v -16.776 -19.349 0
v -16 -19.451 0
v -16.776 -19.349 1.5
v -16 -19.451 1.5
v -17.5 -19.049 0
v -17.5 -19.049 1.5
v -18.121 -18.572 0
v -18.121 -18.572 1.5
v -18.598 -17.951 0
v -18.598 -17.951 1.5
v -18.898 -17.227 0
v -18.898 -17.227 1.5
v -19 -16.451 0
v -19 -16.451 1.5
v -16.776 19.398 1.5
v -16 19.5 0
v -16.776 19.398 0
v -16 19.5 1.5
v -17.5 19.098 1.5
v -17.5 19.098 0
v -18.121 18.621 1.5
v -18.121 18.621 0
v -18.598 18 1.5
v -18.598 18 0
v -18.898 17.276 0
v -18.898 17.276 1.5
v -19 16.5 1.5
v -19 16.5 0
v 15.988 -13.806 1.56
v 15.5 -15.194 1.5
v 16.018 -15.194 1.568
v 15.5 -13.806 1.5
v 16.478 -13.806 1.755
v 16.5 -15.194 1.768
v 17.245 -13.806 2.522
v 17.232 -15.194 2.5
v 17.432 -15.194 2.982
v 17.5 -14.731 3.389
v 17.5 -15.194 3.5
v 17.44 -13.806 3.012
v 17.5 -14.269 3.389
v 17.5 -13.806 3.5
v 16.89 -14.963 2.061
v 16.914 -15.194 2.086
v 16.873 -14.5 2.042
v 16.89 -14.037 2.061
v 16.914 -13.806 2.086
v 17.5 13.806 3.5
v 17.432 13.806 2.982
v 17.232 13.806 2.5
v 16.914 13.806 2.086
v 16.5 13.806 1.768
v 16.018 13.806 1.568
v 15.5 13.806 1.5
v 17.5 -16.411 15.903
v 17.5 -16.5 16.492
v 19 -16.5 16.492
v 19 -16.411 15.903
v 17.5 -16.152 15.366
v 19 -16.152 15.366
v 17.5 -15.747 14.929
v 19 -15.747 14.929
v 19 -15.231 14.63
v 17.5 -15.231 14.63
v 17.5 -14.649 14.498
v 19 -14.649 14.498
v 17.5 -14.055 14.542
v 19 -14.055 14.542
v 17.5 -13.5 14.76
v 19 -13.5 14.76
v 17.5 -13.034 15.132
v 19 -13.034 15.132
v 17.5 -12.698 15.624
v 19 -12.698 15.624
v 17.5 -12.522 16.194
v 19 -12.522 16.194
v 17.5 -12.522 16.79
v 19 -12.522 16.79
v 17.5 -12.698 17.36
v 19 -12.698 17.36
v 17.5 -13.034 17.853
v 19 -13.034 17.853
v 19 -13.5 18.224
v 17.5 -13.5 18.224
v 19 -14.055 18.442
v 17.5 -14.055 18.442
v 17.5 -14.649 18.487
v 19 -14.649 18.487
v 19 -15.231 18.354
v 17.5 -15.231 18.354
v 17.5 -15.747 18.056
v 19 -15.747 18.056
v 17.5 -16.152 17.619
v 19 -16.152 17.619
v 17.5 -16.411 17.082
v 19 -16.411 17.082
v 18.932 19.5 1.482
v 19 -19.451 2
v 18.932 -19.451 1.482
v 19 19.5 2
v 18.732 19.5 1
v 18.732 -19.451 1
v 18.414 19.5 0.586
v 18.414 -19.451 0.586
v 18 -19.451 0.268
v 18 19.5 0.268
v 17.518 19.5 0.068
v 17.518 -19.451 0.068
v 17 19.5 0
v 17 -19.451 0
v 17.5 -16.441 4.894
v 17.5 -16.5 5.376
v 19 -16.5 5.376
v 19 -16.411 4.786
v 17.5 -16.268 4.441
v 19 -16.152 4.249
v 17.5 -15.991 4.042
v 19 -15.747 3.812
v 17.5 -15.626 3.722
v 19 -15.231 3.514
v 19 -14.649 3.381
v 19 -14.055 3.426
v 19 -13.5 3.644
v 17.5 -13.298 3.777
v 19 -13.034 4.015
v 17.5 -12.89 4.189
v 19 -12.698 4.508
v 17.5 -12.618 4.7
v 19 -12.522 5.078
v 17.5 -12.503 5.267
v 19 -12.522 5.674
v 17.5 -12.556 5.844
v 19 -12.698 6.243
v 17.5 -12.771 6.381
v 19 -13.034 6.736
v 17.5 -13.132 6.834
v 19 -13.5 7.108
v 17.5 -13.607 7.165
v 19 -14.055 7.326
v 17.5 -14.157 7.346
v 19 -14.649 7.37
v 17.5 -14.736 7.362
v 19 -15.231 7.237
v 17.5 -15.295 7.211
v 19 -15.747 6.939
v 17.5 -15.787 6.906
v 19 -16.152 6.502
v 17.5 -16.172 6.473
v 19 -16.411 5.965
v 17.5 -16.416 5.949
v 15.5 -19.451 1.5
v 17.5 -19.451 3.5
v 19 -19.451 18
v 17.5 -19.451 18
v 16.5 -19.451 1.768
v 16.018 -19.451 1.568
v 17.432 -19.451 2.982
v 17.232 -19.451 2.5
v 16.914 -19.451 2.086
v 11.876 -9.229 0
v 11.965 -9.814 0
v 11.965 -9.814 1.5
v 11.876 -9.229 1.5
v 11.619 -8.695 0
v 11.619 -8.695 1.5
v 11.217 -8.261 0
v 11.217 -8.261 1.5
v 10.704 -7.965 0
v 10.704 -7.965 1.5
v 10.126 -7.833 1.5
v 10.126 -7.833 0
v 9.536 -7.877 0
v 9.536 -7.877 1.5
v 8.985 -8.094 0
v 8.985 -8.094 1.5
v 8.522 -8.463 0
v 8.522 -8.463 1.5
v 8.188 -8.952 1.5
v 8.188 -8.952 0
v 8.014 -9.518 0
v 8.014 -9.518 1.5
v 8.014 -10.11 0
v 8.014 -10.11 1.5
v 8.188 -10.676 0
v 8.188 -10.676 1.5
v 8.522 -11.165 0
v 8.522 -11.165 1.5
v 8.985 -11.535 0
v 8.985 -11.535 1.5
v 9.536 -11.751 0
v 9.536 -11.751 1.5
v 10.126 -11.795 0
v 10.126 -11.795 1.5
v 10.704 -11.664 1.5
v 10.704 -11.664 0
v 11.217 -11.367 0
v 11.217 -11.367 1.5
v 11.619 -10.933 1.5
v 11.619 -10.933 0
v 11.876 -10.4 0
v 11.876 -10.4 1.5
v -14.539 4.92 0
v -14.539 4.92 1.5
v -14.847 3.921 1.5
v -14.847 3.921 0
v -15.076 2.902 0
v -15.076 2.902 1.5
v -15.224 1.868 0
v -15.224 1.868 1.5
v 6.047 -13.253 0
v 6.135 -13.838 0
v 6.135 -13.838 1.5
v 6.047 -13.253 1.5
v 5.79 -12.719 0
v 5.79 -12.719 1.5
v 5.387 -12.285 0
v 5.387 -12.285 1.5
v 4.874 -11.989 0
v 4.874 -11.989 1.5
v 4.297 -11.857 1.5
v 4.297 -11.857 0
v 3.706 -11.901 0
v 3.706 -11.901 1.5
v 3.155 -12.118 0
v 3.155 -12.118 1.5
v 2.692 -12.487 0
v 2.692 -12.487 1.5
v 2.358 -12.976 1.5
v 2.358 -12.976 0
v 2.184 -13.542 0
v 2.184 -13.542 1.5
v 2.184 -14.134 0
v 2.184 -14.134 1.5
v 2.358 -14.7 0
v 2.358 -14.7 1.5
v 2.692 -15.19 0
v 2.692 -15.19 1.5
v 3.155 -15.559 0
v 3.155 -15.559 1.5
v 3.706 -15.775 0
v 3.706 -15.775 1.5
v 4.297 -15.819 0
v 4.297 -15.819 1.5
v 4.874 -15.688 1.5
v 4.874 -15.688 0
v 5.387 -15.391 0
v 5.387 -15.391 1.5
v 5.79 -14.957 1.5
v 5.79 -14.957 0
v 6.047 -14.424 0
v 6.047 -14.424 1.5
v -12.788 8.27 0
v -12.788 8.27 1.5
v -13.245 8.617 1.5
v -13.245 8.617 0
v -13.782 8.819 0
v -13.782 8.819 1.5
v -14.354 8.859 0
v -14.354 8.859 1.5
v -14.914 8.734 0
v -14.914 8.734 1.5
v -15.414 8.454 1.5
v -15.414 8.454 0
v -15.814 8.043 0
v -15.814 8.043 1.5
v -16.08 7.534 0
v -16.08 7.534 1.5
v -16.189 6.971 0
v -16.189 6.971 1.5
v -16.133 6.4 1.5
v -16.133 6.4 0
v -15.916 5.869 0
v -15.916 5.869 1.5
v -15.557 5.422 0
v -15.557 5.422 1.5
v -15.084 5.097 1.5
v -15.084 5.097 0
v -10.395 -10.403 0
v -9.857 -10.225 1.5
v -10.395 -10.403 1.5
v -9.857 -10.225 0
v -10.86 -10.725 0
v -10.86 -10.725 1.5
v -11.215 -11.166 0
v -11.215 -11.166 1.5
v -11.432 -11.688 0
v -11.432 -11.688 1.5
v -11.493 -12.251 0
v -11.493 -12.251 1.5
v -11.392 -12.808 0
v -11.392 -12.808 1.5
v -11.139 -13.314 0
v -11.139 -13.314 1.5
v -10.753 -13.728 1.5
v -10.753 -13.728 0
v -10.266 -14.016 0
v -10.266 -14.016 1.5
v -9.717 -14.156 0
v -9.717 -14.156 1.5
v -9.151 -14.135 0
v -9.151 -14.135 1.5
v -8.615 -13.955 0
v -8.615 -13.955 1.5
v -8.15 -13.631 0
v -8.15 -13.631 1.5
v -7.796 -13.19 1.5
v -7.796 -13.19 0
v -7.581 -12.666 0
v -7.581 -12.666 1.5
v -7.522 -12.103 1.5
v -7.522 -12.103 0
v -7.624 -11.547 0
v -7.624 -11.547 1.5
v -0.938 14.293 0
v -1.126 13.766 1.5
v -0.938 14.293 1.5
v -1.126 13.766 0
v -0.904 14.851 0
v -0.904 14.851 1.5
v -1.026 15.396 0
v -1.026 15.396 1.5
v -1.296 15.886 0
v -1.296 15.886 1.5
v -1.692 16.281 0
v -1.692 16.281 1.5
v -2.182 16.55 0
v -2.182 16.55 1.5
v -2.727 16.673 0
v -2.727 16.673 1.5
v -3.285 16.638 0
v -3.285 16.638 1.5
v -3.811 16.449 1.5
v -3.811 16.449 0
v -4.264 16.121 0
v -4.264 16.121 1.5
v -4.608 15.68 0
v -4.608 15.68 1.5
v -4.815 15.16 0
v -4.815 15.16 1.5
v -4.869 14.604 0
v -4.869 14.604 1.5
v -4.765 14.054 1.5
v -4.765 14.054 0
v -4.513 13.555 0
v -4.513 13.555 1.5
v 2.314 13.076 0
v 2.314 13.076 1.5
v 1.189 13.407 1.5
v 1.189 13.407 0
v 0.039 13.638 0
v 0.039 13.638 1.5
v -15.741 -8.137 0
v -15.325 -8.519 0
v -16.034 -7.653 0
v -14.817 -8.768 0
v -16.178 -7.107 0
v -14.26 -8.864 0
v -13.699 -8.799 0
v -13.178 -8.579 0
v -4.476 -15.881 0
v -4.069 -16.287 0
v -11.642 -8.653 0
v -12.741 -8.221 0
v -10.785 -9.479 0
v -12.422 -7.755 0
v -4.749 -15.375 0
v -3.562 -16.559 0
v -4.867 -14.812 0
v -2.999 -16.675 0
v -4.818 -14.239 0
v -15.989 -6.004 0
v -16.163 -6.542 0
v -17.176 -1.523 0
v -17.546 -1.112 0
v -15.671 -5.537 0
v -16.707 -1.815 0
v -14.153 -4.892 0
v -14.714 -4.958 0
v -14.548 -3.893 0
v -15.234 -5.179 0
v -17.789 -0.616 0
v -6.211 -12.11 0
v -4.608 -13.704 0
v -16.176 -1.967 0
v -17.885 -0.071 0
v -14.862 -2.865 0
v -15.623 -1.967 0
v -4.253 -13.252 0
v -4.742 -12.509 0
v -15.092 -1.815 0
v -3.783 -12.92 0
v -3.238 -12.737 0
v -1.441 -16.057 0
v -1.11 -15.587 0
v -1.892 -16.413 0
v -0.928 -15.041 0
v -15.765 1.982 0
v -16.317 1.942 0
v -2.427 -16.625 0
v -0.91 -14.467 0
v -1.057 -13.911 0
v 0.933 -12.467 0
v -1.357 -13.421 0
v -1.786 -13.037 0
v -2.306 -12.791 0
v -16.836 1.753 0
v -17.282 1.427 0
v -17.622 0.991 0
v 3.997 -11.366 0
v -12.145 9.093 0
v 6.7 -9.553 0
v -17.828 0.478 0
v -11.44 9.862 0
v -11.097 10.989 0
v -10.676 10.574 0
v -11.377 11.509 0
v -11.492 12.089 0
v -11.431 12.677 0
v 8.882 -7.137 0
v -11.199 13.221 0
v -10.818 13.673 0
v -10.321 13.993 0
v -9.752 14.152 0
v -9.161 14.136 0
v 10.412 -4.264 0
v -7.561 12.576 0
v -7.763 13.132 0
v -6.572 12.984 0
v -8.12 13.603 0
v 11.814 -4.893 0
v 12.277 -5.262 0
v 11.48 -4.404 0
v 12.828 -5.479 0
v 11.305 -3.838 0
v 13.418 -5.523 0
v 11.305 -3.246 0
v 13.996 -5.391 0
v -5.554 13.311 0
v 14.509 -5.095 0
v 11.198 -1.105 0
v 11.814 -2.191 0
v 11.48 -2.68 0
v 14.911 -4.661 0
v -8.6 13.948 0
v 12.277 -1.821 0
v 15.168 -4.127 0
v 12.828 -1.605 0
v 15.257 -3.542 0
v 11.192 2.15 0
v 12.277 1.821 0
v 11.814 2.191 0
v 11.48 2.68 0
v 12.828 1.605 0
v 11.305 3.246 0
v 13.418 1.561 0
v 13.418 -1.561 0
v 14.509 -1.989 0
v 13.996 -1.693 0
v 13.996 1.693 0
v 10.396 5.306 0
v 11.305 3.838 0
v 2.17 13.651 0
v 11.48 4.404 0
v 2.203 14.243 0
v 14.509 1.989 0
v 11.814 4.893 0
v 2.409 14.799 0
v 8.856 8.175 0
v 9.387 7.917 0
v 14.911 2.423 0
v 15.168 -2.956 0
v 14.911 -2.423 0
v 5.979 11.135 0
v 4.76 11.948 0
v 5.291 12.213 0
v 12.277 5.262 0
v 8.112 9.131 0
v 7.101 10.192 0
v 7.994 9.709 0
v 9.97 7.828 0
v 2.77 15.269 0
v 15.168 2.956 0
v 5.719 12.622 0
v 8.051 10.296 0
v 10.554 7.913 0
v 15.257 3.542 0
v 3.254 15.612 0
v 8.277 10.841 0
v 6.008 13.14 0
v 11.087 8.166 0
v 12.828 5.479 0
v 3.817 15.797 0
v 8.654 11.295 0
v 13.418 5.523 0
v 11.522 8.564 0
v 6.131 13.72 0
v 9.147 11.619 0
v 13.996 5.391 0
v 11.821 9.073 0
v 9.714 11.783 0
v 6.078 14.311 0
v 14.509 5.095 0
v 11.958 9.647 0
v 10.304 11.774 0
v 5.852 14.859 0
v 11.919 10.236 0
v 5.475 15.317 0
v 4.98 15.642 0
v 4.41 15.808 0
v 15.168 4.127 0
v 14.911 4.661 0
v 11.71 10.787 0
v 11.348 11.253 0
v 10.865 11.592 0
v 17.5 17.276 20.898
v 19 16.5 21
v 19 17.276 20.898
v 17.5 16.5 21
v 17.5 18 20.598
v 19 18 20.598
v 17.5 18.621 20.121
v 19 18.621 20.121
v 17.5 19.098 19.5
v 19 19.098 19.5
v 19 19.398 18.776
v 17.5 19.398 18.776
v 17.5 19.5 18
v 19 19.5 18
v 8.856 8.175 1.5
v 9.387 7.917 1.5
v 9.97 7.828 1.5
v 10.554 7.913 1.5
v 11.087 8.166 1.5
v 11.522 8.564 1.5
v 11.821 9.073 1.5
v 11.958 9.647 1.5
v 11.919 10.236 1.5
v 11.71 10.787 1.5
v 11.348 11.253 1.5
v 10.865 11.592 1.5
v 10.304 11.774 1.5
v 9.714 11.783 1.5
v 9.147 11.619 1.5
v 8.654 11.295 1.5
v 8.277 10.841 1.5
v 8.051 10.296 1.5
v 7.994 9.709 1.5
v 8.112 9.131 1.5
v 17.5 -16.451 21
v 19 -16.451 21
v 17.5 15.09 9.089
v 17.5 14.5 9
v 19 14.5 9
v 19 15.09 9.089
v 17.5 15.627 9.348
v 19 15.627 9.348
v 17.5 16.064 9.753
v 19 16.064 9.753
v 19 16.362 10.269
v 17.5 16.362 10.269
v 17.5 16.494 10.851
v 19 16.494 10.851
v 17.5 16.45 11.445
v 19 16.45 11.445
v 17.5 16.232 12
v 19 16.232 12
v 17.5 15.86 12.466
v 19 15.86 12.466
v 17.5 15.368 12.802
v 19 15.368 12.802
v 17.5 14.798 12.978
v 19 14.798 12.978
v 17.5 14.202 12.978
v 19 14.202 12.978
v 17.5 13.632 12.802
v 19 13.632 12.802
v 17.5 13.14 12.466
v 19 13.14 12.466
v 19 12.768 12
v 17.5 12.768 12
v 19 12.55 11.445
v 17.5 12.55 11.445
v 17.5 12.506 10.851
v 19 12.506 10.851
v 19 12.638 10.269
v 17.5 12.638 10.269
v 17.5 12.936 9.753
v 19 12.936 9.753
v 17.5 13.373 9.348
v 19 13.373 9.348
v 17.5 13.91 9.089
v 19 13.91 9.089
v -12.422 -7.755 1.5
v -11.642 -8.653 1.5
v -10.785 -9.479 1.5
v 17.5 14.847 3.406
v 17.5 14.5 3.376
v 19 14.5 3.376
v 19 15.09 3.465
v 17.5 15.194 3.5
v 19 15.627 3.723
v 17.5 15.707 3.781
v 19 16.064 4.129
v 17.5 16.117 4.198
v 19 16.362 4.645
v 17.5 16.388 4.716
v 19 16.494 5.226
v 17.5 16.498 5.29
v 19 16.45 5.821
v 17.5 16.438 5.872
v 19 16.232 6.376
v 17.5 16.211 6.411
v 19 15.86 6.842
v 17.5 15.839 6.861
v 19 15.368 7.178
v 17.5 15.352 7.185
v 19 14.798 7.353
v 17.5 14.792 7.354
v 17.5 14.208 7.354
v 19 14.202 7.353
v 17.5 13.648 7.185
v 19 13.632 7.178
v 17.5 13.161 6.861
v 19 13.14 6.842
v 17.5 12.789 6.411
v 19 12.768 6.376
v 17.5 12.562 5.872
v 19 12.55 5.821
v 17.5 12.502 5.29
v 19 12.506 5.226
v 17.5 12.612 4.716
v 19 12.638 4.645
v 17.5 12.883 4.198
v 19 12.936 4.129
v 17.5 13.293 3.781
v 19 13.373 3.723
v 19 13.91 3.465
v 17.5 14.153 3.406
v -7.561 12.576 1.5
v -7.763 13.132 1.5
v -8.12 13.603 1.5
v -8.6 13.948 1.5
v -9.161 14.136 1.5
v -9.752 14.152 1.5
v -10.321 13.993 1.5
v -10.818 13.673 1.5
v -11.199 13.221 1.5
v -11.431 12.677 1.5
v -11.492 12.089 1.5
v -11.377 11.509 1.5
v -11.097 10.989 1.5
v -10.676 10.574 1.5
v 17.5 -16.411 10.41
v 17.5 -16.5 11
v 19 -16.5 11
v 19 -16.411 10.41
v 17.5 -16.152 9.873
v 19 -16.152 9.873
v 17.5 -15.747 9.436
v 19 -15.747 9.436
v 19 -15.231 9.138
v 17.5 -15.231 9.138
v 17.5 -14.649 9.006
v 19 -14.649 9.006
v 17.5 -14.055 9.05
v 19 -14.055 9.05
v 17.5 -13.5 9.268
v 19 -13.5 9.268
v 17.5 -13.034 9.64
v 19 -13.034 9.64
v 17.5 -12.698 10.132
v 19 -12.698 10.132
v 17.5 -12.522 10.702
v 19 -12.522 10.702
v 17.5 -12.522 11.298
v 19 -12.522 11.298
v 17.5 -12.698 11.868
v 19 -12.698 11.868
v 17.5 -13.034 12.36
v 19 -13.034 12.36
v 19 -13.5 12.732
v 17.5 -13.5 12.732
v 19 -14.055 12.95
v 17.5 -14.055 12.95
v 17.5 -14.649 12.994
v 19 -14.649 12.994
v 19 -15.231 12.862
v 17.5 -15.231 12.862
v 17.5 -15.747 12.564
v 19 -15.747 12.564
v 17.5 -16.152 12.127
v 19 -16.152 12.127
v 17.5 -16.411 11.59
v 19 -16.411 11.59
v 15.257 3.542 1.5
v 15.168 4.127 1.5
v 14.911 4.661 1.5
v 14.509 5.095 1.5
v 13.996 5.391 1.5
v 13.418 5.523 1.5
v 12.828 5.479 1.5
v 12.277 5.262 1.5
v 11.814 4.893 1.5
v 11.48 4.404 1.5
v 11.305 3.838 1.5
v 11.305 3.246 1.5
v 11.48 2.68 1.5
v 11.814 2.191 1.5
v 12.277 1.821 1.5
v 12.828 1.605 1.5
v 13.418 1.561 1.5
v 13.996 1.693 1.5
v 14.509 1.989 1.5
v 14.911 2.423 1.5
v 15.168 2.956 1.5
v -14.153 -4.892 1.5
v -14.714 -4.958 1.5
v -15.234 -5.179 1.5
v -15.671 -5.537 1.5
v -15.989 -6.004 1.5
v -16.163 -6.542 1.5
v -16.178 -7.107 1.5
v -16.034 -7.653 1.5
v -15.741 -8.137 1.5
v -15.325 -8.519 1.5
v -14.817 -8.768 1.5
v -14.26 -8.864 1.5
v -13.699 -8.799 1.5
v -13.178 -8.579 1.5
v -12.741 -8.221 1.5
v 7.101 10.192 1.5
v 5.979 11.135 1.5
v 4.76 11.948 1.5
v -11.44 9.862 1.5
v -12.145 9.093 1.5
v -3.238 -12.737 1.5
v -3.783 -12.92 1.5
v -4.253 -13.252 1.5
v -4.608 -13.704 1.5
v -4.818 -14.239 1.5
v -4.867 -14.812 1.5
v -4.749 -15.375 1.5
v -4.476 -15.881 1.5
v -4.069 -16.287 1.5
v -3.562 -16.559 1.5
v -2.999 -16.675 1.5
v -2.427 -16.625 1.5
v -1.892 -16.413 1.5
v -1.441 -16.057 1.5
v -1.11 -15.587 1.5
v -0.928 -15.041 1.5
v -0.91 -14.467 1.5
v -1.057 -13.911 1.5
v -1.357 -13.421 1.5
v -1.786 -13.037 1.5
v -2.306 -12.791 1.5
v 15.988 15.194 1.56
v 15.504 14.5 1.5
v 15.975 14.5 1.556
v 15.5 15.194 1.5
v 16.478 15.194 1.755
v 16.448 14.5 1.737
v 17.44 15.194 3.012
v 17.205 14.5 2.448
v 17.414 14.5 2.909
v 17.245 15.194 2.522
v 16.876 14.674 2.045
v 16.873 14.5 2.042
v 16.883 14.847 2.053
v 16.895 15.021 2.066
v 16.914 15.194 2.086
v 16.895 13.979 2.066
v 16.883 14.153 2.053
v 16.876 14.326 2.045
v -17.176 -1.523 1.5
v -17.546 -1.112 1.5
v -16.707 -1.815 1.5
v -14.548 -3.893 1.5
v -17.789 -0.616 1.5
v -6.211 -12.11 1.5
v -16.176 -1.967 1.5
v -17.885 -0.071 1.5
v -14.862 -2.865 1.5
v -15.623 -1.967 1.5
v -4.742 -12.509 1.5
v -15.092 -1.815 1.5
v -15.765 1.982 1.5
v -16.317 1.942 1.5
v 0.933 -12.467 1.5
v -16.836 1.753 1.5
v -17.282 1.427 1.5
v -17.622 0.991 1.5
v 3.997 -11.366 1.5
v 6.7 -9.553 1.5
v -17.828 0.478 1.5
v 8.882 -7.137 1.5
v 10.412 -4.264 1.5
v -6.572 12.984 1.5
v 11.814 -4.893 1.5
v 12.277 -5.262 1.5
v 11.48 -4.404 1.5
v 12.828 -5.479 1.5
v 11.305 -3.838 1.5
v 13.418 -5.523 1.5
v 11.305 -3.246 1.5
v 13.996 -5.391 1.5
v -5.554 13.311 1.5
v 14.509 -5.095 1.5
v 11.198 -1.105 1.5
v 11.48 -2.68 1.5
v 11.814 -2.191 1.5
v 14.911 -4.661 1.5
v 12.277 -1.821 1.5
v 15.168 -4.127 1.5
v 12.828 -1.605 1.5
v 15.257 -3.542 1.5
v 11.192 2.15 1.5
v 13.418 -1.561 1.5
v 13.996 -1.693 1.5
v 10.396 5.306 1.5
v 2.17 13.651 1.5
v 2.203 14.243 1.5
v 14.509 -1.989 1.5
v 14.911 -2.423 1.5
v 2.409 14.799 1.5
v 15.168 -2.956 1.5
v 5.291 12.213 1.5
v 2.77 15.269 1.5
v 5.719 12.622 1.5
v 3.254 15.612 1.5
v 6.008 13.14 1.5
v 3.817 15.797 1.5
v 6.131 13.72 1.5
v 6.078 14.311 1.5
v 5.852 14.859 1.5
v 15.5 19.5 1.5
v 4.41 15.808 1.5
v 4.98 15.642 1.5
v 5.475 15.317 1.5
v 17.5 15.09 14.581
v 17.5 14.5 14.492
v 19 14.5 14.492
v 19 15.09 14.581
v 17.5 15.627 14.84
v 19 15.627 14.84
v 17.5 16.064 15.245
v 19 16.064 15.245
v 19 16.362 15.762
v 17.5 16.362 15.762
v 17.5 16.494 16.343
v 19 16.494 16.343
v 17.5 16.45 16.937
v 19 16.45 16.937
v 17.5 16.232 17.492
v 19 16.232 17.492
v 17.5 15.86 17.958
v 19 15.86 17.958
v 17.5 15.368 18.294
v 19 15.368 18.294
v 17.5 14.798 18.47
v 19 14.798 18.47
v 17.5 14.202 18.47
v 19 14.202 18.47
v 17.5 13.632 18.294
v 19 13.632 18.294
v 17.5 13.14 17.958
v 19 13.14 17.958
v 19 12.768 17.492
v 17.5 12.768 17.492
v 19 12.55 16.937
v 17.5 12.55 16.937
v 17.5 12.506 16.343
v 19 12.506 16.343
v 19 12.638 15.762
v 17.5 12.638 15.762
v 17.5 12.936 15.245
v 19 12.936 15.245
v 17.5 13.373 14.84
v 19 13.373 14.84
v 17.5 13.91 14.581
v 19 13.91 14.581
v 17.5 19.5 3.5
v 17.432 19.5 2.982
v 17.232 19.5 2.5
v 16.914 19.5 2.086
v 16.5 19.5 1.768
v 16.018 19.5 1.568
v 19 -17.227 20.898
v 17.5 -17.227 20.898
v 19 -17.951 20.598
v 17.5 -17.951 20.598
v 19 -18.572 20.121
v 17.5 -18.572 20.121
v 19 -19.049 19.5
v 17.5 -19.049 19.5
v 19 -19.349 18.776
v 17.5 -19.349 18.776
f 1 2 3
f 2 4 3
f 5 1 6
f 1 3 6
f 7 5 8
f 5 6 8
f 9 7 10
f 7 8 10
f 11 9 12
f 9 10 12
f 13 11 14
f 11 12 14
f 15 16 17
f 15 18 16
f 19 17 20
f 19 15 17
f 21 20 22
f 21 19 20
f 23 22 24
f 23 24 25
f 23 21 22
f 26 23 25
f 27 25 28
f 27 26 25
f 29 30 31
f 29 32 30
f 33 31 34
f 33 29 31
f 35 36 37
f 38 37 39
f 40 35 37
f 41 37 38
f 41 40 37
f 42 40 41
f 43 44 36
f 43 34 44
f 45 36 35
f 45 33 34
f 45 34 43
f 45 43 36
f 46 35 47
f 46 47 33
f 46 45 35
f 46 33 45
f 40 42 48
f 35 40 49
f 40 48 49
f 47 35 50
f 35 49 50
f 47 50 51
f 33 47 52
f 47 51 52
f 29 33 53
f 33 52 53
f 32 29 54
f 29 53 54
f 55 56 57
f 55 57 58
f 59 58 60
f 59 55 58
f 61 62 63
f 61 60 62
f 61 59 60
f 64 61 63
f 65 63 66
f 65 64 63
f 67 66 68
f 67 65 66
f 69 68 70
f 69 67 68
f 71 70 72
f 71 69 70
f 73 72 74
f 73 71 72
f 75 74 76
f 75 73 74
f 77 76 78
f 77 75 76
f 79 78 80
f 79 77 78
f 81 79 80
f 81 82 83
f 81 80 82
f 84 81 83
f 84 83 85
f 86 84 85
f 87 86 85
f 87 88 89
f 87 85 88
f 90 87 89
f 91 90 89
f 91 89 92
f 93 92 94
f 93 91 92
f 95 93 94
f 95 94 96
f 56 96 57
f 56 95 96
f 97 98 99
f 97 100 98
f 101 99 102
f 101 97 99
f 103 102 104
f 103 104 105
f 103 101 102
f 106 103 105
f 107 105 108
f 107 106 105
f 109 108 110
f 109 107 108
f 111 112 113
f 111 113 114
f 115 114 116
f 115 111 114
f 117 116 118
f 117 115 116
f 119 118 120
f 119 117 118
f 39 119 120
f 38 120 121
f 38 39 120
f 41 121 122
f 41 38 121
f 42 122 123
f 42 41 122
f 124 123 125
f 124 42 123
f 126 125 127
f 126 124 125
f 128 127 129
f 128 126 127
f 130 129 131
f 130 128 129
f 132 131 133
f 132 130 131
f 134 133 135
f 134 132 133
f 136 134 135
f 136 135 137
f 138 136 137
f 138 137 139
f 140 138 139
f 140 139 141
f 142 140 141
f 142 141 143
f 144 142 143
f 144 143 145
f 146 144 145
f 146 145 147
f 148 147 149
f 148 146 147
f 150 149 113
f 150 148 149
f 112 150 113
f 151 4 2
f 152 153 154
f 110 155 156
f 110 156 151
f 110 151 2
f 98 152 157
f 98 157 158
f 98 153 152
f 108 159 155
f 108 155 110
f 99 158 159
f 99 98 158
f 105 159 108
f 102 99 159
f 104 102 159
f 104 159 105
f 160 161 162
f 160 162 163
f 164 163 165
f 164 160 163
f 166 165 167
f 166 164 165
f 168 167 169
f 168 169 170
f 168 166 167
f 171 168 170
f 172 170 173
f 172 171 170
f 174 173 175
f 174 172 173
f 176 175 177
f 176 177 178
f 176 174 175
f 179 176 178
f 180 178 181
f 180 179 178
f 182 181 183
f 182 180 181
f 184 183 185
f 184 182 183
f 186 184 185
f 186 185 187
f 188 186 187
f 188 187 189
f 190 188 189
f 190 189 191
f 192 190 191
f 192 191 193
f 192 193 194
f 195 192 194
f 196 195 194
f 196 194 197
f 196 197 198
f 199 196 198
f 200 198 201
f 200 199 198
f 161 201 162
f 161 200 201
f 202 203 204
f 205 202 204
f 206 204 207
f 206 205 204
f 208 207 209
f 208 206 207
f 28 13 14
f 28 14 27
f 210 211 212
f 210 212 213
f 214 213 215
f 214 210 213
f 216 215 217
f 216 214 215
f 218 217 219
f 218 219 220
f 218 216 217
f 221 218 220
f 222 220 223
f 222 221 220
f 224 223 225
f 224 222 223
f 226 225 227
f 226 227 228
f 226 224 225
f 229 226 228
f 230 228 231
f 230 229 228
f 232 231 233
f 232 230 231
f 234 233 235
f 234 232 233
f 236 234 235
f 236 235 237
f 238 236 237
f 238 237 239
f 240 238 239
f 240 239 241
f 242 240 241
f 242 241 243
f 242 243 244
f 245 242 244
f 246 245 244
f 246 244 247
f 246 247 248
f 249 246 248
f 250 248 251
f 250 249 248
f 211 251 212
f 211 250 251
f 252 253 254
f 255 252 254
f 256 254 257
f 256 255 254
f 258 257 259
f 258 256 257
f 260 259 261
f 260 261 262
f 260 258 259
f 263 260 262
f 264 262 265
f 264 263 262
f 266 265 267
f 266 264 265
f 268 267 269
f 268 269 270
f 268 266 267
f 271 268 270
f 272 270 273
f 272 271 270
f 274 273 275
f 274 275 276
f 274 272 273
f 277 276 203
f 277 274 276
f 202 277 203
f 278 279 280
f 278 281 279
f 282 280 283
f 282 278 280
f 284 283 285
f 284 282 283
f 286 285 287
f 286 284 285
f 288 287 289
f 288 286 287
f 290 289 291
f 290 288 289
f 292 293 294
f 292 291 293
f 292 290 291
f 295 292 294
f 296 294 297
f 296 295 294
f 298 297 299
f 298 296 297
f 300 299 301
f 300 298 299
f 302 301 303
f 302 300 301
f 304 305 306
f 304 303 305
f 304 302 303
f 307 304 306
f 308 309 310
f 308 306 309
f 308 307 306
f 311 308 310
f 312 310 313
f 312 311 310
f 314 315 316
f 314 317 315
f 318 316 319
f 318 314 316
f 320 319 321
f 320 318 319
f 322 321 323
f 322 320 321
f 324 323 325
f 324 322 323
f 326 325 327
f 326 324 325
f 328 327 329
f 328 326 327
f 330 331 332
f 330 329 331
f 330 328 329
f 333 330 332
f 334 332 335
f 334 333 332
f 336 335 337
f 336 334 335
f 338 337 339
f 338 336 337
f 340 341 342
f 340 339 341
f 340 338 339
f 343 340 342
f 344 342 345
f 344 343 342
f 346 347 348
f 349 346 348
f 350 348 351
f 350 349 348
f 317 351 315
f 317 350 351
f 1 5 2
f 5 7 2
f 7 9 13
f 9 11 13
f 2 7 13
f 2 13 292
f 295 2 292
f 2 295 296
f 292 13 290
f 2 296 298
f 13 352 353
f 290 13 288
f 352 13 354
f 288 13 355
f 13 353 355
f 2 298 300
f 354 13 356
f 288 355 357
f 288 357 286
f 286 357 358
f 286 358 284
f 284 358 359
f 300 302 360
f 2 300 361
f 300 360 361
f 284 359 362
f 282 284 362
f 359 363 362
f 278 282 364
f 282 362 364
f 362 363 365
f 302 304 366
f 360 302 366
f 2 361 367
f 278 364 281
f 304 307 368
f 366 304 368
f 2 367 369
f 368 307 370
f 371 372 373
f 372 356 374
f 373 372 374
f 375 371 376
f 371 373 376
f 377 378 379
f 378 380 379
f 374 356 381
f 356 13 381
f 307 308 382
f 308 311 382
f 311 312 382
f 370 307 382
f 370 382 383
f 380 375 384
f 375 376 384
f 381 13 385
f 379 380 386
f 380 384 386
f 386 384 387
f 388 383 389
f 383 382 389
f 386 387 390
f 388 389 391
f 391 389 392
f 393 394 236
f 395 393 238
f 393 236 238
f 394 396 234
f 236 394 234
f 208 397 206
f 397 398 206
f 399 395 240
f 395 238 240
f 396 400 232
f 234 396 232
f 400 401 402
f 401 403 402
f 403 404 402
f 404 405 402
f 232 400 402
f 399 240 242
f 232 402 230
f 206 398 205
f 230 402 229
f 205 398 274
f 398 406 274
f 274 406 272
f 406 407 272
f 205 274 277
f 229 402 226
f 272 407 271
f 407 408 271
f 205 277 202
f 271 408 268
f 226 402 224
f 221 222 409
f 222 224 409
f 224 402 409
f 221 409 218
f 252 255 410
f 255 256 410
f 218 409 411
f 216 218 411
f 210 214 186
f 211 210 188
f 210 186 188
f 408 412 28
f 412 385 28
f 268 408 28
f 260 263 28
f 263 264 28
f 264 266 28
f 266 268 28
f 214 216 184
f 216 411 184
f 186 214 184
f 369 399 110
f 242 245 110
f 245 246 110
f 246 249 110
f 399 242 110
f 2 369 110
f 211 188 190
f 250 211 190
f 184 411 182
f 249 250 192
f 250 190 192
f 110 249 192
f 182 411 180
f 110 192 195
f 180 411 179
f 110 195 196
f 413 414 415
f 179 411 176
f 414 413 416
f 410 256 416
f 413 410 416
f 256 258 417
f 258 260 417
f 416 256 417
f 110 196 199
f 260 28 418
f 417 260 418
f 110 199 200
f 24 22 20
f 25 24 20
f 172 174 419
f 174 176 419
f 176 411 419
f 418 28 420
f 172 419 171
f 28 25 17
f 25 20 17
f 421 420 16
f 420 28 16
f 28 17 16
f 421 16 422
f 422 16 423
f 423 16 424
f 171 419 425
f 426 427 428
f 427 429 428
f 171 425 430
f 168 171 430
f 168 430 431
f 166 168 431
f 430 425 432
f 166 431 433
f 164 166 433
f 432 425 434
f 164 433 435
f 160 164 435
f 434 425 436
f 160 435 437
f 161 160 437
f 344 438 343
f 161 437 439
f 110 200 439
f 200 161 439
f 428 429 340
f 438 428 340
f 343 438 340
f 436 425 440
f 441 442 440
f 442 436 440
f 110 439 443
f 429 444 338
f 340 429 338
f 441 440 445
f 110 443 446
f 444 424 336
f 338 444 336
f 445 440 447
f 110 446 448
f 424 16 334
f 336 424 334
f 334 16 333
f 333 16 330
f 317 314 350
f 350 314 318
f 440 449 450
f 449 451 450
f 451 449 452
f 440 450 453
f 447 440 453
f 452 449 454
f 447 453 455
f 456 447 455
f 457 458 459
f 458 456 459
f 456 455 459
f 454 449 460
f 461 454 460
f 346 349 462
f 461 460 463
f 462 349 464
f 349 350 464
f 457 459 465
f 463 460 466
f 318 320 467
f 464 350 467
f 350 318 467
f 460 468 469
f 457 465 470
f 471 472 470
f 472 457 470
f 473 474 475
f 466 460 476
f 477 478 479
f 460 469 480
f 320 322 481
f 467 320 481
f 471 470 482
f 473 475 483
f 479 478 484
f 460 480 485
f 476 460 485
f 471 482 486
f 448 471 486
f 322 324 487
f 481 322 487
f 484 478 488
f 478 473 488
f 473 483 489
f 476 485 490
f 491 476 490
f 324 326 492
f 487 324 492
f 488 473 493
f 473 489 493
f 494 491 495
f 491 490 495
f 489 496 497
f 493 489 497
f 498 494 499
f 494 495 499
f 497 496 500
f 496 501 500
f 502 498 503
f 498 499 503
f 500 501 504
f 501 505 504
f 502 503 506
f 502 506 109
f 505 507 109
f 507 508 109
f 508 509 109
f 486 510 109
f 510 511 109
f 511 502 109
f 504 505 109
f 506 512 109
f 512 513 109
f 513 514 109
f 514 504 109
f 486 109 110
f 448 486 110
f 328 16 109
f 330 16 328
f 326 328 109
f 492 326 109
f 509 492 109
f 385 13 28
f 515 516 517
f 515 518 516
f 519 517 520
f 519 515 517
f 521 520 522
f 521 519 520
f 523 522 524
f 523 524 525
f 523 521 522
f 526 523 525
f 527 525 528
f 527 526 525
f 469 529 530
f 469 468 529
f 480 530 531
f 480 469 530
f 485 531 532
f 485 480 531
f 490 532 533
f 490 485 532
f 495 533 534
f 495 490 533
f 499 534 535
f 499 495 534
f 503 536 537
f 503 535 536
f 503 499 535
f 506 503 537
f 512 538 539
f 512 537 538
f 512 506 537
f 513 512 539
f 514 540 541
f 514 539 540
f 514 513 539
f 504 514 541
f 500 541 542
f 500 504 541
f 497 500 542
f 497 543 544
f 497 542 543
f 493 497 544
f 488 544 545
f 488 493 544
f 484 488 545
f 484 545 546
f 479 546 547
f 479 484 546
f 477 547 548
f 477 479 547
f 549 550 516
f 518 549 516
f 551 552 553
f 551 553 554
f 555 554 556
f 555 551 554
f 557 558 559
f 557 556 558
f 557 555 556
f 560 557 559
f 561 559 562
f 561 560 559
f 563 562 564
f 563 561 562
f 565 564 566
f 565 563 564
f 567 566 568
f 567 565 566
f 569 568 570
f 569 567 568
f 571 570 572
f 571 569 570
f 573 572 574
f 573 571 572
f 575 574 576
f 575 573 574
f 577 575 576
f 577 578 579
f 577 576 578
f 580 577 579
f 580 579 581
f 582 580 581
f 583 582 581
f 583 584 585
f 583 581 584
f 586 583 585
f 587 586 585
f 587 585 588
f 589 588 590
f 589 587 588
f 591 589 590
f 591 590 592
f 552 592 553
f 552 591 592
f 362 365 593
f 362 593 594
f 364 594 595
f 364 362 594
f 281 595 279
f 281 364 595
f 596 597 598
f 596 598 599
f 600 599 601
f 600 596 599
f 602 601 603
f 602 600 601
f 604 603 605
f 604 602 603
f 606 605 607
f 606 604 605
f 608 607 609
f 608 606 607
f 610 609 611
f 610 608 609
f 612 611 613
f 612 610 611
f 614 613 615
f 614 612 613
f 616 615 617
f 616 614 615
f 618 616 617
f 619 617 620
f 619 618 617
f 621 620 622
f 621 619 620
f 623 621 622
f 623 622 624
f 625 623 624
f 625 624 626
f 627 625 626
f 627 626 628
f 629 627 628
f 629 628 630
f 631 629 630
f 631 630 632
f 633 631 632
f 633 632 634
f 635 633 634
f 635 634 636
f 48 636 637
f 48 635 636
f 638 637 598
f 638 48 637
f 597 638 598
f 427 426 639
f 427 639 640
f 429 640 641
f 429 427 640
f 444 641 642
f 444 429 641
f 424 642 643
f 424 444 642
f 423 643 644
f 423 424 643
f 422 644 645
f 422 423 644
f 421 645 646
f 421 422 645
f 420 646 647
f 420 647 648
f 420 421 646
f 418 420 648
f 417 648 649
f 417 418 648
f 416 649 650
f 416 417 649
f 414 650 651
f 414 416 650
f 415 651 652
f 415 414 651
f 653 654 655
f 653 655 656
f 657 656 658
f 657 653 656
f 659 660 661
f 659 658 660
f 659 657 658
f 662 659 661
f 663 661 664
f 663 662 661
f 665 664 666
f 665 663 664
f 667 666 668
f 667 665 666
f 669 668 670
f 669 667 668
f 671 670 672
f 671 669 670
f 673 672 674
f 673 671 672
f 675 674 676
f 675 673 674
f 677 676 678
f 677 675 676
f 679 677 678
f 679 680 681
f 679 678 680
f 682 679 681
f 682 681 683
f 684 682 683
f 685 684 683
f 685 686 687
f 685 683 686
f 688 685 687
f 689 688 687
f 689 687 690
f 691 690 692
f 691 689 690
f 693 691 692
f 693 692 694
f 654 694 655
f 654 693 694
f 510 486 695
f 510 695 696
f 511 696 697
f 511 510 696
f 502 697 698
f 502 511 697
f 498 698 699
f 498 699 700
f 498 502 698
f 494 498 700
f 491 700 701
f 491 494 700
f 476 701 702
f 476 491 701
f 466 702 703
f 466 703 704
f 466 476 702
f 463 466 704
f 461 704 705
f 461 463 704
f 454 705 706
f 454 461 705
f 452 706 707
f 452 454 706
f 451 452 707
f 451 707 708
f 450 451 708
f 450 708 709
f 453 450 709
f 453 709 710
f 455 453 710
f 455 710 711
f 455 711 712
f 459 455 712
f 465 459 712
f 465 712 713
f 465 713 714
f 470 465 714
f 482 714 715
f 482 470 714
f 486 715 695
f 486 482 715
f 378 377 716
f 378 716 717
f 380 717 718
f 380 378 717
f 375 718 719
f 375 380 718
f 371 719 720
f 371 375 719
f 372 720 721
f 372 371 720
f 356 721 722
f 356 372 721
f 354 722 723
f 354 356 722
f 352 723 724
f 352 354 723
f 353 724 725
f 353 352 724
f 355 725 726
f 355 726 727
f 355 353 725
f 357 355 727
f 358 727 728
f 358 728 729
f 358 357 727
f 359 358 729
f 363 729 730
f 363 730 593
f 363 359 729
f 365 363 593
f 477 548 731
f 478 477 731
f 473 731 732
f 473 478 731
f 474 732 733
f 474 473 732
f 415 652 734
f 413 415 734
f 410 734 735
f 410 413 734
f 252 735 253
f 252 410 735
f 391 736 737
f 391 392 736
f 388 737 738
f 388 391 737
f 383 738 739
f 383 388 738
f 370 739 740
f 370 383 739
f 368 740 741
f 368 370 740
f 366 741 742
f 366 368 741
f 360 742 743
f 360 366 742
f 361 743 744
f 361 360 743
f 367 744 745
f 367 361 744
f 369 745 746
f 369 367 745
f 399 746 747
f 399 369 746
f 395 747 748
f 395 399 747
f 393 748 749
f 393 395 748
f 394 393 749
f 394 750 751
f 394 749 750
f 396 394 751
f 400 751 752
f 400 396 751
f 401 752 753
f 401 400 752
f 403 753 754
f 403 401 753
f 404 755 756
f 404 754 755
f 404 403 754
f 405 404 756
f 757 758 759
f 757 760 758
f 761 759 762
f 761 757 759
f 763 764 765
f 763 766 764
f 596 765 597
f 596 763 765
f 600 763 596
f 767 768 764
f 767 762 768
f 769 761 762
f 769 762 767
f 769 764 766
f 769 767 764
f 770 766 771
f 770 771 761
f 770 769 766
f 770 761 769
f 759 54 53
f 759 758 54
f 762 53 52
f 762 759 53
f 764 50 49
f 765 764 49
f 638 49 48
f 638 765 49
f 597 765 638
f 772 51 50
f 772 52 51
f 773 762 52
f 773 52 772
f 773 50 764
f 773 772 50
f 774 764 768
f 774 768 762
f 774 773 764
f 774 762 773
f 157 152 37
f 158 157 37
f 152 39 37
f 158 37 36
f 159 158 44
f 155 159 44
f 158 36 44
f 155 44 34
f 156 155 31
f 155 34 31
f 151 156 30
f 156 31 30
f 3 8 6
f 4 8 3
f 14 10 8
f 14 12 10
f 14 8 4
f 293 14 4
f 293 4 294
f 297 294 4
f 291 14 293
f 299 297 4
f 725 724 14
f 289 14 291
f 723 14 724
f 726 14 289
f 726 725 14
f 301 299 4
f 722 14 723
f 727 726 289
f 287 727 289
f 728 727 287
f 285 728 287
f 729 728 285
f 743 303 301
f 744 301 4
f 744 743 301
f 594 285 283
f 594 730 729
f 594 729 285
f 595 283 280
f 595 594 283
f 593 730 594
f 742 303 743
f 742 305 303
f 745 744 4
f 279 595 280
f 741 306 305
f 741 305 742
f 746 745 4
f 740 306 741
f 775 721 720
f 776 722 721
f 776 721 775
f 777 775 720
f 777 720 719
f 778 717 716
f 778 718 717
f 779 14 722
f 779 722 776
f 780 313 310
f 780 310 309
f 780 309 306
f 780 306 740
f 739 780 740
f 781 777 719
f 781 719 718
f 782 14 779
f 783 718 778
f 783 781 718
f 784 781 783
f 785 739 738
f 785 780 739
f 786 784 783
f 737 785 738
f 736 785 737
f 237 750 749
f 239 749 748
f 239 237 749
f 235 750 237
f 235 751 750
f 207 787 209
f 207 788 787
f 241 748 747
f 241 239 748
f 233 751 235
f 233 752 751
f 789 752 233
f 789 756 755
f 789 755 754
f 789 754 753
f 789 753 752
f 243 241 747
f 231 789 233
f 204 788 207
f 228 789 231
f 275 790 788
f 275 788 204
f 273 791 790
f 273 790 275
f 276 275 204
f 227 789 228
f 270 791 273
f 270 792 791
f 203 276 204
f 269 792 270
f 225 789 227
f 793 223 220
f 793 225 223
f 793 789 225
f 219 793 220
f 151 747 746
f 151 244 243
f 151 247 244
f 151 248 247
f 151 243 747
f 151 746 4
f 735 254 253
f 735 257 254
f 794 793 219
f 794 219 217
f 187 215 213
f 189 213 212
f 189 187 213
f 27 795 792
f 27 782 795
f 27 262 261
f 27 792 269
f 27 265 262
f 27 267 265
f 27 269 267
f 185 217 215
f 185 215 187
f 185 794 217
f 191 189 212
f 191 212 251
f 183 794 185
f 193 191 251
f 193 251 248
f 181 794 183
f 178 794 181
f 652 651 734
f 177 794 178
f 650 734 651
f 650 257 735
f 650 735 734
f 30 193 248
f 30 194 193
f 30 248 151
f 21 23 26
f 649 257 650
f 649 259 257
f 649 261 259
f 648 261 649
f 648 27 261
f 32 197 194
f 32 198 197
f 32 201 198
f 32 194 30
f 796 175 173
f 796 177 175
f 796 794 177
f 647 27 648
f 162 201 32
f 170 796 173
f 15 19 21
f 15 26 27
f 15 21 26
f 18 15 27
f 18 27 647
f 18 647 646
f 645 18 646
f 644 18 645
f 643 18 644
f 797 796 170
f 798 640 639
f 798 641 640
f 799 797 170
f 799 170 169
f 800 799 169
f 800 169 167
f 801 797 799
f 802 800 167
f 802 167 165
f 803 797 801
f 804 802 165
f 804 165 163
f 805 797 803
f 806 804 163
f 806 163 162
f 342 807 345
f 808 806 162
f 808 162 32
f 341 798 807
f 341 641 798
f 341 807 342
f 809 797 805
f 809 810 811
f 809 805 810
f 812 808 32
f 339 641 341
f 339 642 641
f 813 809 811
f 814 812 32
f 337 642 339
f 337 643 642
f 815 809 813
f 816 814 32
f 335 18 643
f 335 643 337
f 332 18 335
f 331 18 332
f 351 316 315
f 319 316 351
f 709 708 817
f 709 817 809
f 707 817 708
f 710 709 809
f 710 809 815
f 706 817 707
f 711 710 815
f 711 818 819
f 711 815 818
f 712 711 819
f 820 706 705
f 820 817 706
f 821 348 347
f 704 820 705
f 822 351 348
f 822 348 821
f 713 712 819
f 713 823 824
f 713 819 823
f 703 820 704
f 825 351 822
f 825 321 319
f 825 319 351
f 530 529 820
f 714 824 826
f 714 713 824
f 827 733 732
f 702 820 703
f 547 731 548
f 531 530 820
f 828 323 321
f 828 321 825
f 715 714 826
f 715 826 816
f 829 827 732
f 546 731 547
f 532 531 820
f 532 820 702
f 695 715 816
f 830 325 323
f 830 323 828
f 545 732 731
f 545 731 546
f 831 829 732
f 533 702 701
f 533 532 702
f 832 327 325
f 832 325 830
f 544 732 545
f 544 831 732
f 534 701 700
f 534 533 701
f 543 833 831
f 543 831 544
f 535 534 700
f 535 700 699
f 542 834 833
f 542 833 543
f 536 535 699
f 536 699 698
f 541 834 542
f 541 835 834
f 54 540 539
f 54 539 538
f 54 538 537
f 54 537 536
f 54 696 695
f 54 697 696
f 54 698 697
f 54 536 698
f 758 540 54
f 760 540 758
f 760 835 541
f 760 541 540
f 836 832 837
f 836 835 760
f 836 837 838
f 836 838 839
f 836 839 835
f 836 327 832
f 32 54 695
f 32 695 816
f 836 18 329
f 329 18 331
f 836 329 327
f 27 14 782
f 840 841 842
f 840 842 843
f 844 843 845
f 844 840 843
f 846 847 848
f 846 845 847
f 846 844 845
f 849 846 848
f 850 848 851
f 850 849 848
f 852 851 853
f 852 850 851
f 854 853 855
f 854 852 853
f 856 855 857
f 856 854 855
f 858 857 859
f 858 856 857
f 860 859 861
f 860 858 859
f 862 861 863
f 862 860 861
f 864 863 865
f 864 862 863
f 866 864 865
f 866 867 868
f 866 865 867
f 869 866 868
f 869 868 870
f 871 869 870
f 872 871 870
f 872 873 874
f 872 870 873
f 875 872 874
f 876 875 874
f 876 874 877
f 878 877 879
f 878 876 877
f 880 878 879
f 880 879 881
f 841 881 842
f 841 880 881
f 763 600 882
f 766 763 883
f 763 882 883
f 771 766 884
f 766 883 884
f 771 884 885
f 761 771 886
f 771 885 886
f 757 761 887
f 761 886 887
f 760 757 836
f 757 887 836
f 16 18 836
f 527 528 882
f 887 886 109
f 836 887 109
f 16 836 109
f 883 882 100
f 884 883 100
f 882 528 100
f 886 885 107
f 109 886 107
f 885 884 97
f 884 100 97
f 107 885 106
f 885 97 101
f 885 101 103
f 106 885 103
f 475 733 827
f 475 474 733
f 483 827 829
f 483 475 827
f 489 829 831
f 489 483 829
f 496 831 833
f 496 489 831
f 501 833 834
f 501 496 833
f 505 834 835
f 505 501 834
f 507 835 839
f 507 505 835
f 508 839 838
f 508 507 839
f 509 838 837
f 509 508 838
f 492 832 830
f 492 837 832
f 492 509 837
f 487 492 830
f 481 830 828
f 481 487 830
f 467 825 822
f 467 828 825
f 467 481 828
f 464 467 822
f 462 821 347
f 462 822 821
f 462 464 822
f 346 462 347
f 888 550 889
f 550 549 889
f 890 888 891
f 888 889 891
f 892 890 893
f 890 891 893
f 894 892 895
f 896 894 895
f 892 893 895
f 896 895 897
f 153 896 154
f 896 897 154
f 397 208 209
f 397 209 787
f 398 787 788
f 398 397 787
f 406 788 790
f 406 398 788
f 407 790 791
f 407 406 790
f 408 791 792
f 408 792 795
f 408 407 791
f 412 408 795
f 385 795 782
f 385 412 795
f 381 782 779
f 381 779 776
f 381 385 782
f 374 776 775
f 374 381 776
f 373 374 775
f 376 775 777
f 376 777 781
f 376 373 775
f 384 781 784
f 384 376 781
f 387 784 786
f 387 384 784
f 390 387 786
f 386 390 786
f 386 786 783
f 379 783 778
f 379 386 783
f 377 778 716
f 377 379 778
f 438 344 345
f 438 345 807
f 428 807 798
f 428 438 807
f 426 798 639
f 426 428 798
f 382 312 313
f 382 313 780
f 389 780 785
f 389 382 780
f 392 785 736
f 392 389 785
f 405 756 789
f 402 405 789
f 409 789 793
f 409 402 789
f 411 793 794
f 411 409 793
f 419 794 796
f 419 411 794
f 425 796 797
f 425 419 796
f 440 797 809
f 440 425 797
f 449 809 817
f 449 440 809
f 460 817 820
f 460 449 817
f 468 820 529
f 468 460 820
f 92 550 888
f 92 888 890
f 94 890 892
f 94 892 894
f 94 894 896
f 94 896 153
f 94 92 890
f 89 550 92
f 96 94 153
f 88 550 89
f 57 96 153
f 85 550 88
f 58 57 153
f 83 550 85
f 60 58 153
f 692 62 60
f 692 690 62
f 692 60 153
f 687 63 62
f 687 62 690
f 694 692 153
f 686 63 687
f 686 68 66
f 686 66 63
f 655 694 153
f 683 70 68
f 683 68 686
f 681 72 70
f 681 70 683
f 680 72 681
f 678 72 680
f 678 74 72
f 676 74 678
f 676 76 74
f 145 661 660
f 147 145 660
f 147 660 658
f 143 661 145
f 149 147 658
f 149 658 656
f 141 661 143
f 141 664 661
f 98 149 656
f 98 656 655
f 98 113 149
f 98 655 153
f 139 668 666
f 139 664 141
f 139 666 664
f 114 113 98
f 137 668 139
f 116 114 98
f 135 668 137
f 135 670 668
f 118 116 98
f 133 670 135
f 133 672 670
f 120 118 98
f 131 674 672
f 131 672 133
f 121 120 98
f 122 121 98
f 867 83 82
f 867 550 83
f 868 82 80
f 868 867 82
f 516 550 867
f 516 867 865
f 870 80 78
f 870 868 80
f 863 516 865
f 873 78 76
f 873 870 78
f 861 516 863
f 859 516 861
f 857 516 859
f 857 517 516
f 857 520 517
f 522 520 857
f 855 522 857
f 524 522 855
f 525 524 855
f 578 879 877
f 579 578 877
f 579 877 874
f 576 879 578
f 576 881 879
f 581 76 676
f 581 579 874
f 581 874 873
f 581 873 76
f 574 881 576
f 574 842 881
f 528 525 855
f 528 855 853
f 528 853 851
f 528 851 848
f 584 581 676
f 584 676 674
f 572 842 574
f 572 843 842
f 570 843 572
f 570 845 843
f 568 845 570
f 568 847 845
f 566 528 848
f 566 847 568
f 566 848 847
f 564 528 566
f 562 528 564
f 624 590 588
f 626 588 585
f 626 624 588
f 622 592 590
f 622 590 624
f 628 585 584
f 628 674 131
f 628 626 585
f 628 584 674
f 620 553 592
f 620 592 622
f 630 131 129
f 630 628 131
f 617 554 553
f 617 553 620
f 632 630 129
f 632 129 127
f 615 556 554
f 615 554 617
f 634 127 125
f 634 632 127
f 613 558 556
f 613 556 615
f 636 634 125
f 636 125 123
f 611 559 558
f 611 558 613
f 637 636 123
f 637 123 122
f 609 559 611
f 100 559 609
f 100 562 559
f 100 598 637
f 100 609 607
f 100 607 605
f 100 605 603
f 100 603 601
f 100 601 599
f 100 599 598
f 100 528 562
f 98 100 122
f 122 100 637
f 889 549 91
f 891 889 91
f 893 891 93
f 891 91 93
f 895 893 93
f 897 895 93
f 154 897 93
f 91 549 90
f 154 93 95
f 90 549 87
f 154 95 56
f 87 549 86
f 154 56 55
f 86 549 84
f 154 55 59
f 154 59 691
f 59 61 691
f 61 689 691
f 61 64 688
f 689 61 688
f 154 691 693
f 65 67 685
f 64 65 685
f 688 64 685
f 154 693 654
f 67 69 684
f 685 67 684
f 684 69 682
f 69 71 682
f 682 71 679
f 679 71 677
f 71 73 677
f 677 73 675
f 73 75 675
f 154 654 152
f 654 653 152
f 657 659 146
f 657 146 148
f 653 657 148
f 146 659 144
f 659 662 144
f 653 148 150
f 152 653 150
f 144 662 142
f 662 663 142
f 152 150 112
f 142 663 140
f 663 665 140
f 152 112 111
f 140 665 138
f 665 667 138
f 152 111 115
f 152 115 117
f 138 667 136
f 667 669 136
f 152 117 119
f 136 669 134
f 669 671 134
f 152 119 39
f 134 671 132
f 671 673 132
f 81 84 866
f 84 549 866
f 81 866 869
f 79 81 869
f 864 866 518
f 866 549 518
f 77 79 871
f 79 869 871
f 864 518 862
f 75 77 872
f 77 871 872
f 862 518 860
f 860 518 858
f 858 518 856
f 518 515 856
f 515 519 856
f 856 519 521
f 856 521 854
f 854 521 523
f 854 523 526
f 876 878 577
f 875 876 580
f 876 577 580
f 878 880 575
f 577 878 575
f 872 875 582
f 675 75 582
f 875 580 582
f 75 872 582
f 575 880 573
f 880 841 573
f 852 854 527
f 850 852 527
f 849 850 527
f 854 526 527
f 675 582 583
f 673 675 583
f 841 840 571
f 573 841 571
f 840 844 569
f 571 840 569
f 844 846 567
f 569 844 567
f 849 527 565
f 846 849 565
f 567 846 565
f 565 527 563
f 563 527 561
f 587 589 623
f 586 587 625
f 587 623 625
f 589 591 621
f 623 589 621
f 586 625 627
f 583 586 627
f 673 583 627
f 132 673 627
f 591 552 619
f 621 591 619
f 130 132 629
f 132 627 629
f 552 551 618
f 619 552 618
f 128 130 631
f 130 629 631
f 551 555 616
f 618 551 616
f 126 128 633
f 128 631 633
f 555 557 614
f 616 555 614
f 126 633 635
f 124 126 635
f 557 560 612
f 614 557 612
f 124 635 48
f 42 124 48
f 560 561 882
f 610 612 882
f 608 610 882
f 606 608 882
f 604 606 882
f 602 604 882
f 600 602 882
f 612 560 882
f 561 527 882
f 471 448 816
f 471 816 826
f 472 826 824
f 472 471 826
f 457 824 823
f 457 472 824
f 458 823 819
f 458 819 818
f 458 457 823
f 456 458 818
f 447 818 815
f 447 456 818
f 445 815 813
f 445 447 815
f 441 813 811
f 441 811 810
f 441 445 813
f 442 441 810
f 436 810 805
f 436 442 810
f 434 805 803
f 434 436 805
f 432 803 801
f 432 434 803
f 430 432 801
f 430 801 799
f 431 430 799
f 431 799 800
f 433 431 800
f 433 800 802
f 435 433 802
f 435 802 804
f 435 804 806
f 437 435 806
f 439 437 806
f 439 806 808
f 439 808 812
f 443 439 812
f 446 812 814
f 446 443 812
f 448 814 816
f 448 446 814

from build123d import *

# Parameters (mm, degrees)
SKETCH1_W               = 38
SKETCH1_H               = 38.950729927
SKETCH1_R               = 13.294995111
BOSS_EXTRUDE1_DEPTH     = 1.5
SKETCH4_W               = 19.5
SKETCH4_H               = 38.950729927
BOSS_EXTRUDE2_DEPTH     = 1.5
CUT_EXTRUDE2_DEPTH      = 35.383862494
CUT_EXTRUDE2_DEPTH_BACK = 35.383862494
SKETCH5_R               = 2
FILLET2_R               = 3
FILLET6_R               = 2
SKETCH6_R               = 1.98665291
CUT_EXTRUDE5_DEPTH      = 1.5


with BuildPart() as part:
    # Sketch1 → Boss-Extrude1 (new body)
    with BuildSketch(Plane.XY):
        with Locations((0, 0.024635036)):
            Rectangle(SKETCH1_W, SKETCH1_H)
        with Locations((-2, 0.5)):
            Circle(SKETCH1_R, mode=Mode.SUBTRACT)
    extrude(amount=BOSS_EXTRUDE1_DEPTH)

    # Sketch4 → Boss-Extrude2 (add)
    with BuildSketch(Plane(origin=(19, 0, 0), x_dir=(0, 0, -1), z_dir=(1, 0, 0))):
        with Locations((-11.25, 0.024635036)):
            Rectangle(SKETCH4_W, SKETCH4_H)
    extrude(amount=-BOSS_EXTRUDE2_DEPTH)

    # Sketch5 → Cut-Extrude2 (cut, two sides: drawn at the far end of the back side and taken through both)
    with BuildSketch(Plane(origin=(0, 0, 0), x_dir=(0, 0, -1), z_dir=(1, 0, 0)).offset(-CUT_EXTRUDE2_DEPTH_BACK)):
        with Locations((-5.375668666, 14.5)):
            Circle(SKETCH5_R)
        with Locations((-11, 14.5)):
            Circle(SKETCH5_R)
        with Locations((-16.492234483, 14.5)):
            Circle(SKETCH5_R)
        with Locations(Location((-16.492234483, -14.5, 0), (0, 0, 270))):
            Circle(SKETCH5_R)
        with Locations(Location((-11, -14.5, 0), (0, 0, 270))):
            Circle(SKETCH5_R)
        with Locations(Location((-5.375668666, -14.5, 0), (0, 0, 270))):
            Circle(SKETCH5_R)
    extrude(amount=CUT_EXTRUDE2_DEPTH + CUT_EXTRUDE2_DEPTH_BACK, mode=Mode.SUBTRACT)

    # Fillet2
    fillet2_edges = [part.edges().sort_by_distance(p)[0] for p in [
        (18.25, -19.450729927, 21),
        (18.25, 19.5, 21),
        (-19, -19.450729927, 0.75),
        (-19, 19.5, 0.75),
    ]]
    fillet(fillet2_edges, radius=FILLET2_R)

    # Fillet6
    fillet6_edges = [part.edges().sort_by_distance(p)[0] for p in [
        (19, 0.024635036, 0),
        (17.5, 0.024635036, 1.5),
    ]]
    fillet(fillet6_edges, radius=FILLET6_R)

    # Sketch6 → Cut-Extrude5 (cut)
    with BuildSketch(Plane.XY):
        with Locations((-15.899992969, 0)):
            Circle(SKETCH6_R)
        with Locations((-14.204742149, 6.877902946)):
            Circle(SKETCH6_R)
        with Locations((-9.507351221, 12.180161215)):
            Circle(SKETCH6_R)
        with Locations((-2.883935837, 14.692091337)):
            Circle(SKETCH6_R)
        with Locations((4.148159359, 13.838240392)):
            Circle(SKETCH6_R)
        with Locations((9.977966104, 9.814215342)):
            Circle(SKETCH6_R)
        with Locations((13.269945929, 3.541871831)):
            Circle(SKETCH6_R)
        with Locations((13.269945929, -3.541871831)):
            Circle(SKETCH6_R)
        with Locations((9.977966104, -9.814215342)):
            Circle(SKETCH6_R)
        with Locations((4.148159359, -13.838240392)):
            Circle(SKETCH6_R)
        with Locations((-2.883935837, -14.692091337)):
            Circle(SKETCH6_R)
        with Locations((-9.507351221, -12.180161215)):
            Circle(SKETCH6_R)
        with Locations((-14.204742149, -6.877902946)):
            Circle(SKETCH6_R)
    extrude(amount=CUT_EXTRUDE5_DEPTH, mode=Mode.SUBTRACT)


solid = part.part
